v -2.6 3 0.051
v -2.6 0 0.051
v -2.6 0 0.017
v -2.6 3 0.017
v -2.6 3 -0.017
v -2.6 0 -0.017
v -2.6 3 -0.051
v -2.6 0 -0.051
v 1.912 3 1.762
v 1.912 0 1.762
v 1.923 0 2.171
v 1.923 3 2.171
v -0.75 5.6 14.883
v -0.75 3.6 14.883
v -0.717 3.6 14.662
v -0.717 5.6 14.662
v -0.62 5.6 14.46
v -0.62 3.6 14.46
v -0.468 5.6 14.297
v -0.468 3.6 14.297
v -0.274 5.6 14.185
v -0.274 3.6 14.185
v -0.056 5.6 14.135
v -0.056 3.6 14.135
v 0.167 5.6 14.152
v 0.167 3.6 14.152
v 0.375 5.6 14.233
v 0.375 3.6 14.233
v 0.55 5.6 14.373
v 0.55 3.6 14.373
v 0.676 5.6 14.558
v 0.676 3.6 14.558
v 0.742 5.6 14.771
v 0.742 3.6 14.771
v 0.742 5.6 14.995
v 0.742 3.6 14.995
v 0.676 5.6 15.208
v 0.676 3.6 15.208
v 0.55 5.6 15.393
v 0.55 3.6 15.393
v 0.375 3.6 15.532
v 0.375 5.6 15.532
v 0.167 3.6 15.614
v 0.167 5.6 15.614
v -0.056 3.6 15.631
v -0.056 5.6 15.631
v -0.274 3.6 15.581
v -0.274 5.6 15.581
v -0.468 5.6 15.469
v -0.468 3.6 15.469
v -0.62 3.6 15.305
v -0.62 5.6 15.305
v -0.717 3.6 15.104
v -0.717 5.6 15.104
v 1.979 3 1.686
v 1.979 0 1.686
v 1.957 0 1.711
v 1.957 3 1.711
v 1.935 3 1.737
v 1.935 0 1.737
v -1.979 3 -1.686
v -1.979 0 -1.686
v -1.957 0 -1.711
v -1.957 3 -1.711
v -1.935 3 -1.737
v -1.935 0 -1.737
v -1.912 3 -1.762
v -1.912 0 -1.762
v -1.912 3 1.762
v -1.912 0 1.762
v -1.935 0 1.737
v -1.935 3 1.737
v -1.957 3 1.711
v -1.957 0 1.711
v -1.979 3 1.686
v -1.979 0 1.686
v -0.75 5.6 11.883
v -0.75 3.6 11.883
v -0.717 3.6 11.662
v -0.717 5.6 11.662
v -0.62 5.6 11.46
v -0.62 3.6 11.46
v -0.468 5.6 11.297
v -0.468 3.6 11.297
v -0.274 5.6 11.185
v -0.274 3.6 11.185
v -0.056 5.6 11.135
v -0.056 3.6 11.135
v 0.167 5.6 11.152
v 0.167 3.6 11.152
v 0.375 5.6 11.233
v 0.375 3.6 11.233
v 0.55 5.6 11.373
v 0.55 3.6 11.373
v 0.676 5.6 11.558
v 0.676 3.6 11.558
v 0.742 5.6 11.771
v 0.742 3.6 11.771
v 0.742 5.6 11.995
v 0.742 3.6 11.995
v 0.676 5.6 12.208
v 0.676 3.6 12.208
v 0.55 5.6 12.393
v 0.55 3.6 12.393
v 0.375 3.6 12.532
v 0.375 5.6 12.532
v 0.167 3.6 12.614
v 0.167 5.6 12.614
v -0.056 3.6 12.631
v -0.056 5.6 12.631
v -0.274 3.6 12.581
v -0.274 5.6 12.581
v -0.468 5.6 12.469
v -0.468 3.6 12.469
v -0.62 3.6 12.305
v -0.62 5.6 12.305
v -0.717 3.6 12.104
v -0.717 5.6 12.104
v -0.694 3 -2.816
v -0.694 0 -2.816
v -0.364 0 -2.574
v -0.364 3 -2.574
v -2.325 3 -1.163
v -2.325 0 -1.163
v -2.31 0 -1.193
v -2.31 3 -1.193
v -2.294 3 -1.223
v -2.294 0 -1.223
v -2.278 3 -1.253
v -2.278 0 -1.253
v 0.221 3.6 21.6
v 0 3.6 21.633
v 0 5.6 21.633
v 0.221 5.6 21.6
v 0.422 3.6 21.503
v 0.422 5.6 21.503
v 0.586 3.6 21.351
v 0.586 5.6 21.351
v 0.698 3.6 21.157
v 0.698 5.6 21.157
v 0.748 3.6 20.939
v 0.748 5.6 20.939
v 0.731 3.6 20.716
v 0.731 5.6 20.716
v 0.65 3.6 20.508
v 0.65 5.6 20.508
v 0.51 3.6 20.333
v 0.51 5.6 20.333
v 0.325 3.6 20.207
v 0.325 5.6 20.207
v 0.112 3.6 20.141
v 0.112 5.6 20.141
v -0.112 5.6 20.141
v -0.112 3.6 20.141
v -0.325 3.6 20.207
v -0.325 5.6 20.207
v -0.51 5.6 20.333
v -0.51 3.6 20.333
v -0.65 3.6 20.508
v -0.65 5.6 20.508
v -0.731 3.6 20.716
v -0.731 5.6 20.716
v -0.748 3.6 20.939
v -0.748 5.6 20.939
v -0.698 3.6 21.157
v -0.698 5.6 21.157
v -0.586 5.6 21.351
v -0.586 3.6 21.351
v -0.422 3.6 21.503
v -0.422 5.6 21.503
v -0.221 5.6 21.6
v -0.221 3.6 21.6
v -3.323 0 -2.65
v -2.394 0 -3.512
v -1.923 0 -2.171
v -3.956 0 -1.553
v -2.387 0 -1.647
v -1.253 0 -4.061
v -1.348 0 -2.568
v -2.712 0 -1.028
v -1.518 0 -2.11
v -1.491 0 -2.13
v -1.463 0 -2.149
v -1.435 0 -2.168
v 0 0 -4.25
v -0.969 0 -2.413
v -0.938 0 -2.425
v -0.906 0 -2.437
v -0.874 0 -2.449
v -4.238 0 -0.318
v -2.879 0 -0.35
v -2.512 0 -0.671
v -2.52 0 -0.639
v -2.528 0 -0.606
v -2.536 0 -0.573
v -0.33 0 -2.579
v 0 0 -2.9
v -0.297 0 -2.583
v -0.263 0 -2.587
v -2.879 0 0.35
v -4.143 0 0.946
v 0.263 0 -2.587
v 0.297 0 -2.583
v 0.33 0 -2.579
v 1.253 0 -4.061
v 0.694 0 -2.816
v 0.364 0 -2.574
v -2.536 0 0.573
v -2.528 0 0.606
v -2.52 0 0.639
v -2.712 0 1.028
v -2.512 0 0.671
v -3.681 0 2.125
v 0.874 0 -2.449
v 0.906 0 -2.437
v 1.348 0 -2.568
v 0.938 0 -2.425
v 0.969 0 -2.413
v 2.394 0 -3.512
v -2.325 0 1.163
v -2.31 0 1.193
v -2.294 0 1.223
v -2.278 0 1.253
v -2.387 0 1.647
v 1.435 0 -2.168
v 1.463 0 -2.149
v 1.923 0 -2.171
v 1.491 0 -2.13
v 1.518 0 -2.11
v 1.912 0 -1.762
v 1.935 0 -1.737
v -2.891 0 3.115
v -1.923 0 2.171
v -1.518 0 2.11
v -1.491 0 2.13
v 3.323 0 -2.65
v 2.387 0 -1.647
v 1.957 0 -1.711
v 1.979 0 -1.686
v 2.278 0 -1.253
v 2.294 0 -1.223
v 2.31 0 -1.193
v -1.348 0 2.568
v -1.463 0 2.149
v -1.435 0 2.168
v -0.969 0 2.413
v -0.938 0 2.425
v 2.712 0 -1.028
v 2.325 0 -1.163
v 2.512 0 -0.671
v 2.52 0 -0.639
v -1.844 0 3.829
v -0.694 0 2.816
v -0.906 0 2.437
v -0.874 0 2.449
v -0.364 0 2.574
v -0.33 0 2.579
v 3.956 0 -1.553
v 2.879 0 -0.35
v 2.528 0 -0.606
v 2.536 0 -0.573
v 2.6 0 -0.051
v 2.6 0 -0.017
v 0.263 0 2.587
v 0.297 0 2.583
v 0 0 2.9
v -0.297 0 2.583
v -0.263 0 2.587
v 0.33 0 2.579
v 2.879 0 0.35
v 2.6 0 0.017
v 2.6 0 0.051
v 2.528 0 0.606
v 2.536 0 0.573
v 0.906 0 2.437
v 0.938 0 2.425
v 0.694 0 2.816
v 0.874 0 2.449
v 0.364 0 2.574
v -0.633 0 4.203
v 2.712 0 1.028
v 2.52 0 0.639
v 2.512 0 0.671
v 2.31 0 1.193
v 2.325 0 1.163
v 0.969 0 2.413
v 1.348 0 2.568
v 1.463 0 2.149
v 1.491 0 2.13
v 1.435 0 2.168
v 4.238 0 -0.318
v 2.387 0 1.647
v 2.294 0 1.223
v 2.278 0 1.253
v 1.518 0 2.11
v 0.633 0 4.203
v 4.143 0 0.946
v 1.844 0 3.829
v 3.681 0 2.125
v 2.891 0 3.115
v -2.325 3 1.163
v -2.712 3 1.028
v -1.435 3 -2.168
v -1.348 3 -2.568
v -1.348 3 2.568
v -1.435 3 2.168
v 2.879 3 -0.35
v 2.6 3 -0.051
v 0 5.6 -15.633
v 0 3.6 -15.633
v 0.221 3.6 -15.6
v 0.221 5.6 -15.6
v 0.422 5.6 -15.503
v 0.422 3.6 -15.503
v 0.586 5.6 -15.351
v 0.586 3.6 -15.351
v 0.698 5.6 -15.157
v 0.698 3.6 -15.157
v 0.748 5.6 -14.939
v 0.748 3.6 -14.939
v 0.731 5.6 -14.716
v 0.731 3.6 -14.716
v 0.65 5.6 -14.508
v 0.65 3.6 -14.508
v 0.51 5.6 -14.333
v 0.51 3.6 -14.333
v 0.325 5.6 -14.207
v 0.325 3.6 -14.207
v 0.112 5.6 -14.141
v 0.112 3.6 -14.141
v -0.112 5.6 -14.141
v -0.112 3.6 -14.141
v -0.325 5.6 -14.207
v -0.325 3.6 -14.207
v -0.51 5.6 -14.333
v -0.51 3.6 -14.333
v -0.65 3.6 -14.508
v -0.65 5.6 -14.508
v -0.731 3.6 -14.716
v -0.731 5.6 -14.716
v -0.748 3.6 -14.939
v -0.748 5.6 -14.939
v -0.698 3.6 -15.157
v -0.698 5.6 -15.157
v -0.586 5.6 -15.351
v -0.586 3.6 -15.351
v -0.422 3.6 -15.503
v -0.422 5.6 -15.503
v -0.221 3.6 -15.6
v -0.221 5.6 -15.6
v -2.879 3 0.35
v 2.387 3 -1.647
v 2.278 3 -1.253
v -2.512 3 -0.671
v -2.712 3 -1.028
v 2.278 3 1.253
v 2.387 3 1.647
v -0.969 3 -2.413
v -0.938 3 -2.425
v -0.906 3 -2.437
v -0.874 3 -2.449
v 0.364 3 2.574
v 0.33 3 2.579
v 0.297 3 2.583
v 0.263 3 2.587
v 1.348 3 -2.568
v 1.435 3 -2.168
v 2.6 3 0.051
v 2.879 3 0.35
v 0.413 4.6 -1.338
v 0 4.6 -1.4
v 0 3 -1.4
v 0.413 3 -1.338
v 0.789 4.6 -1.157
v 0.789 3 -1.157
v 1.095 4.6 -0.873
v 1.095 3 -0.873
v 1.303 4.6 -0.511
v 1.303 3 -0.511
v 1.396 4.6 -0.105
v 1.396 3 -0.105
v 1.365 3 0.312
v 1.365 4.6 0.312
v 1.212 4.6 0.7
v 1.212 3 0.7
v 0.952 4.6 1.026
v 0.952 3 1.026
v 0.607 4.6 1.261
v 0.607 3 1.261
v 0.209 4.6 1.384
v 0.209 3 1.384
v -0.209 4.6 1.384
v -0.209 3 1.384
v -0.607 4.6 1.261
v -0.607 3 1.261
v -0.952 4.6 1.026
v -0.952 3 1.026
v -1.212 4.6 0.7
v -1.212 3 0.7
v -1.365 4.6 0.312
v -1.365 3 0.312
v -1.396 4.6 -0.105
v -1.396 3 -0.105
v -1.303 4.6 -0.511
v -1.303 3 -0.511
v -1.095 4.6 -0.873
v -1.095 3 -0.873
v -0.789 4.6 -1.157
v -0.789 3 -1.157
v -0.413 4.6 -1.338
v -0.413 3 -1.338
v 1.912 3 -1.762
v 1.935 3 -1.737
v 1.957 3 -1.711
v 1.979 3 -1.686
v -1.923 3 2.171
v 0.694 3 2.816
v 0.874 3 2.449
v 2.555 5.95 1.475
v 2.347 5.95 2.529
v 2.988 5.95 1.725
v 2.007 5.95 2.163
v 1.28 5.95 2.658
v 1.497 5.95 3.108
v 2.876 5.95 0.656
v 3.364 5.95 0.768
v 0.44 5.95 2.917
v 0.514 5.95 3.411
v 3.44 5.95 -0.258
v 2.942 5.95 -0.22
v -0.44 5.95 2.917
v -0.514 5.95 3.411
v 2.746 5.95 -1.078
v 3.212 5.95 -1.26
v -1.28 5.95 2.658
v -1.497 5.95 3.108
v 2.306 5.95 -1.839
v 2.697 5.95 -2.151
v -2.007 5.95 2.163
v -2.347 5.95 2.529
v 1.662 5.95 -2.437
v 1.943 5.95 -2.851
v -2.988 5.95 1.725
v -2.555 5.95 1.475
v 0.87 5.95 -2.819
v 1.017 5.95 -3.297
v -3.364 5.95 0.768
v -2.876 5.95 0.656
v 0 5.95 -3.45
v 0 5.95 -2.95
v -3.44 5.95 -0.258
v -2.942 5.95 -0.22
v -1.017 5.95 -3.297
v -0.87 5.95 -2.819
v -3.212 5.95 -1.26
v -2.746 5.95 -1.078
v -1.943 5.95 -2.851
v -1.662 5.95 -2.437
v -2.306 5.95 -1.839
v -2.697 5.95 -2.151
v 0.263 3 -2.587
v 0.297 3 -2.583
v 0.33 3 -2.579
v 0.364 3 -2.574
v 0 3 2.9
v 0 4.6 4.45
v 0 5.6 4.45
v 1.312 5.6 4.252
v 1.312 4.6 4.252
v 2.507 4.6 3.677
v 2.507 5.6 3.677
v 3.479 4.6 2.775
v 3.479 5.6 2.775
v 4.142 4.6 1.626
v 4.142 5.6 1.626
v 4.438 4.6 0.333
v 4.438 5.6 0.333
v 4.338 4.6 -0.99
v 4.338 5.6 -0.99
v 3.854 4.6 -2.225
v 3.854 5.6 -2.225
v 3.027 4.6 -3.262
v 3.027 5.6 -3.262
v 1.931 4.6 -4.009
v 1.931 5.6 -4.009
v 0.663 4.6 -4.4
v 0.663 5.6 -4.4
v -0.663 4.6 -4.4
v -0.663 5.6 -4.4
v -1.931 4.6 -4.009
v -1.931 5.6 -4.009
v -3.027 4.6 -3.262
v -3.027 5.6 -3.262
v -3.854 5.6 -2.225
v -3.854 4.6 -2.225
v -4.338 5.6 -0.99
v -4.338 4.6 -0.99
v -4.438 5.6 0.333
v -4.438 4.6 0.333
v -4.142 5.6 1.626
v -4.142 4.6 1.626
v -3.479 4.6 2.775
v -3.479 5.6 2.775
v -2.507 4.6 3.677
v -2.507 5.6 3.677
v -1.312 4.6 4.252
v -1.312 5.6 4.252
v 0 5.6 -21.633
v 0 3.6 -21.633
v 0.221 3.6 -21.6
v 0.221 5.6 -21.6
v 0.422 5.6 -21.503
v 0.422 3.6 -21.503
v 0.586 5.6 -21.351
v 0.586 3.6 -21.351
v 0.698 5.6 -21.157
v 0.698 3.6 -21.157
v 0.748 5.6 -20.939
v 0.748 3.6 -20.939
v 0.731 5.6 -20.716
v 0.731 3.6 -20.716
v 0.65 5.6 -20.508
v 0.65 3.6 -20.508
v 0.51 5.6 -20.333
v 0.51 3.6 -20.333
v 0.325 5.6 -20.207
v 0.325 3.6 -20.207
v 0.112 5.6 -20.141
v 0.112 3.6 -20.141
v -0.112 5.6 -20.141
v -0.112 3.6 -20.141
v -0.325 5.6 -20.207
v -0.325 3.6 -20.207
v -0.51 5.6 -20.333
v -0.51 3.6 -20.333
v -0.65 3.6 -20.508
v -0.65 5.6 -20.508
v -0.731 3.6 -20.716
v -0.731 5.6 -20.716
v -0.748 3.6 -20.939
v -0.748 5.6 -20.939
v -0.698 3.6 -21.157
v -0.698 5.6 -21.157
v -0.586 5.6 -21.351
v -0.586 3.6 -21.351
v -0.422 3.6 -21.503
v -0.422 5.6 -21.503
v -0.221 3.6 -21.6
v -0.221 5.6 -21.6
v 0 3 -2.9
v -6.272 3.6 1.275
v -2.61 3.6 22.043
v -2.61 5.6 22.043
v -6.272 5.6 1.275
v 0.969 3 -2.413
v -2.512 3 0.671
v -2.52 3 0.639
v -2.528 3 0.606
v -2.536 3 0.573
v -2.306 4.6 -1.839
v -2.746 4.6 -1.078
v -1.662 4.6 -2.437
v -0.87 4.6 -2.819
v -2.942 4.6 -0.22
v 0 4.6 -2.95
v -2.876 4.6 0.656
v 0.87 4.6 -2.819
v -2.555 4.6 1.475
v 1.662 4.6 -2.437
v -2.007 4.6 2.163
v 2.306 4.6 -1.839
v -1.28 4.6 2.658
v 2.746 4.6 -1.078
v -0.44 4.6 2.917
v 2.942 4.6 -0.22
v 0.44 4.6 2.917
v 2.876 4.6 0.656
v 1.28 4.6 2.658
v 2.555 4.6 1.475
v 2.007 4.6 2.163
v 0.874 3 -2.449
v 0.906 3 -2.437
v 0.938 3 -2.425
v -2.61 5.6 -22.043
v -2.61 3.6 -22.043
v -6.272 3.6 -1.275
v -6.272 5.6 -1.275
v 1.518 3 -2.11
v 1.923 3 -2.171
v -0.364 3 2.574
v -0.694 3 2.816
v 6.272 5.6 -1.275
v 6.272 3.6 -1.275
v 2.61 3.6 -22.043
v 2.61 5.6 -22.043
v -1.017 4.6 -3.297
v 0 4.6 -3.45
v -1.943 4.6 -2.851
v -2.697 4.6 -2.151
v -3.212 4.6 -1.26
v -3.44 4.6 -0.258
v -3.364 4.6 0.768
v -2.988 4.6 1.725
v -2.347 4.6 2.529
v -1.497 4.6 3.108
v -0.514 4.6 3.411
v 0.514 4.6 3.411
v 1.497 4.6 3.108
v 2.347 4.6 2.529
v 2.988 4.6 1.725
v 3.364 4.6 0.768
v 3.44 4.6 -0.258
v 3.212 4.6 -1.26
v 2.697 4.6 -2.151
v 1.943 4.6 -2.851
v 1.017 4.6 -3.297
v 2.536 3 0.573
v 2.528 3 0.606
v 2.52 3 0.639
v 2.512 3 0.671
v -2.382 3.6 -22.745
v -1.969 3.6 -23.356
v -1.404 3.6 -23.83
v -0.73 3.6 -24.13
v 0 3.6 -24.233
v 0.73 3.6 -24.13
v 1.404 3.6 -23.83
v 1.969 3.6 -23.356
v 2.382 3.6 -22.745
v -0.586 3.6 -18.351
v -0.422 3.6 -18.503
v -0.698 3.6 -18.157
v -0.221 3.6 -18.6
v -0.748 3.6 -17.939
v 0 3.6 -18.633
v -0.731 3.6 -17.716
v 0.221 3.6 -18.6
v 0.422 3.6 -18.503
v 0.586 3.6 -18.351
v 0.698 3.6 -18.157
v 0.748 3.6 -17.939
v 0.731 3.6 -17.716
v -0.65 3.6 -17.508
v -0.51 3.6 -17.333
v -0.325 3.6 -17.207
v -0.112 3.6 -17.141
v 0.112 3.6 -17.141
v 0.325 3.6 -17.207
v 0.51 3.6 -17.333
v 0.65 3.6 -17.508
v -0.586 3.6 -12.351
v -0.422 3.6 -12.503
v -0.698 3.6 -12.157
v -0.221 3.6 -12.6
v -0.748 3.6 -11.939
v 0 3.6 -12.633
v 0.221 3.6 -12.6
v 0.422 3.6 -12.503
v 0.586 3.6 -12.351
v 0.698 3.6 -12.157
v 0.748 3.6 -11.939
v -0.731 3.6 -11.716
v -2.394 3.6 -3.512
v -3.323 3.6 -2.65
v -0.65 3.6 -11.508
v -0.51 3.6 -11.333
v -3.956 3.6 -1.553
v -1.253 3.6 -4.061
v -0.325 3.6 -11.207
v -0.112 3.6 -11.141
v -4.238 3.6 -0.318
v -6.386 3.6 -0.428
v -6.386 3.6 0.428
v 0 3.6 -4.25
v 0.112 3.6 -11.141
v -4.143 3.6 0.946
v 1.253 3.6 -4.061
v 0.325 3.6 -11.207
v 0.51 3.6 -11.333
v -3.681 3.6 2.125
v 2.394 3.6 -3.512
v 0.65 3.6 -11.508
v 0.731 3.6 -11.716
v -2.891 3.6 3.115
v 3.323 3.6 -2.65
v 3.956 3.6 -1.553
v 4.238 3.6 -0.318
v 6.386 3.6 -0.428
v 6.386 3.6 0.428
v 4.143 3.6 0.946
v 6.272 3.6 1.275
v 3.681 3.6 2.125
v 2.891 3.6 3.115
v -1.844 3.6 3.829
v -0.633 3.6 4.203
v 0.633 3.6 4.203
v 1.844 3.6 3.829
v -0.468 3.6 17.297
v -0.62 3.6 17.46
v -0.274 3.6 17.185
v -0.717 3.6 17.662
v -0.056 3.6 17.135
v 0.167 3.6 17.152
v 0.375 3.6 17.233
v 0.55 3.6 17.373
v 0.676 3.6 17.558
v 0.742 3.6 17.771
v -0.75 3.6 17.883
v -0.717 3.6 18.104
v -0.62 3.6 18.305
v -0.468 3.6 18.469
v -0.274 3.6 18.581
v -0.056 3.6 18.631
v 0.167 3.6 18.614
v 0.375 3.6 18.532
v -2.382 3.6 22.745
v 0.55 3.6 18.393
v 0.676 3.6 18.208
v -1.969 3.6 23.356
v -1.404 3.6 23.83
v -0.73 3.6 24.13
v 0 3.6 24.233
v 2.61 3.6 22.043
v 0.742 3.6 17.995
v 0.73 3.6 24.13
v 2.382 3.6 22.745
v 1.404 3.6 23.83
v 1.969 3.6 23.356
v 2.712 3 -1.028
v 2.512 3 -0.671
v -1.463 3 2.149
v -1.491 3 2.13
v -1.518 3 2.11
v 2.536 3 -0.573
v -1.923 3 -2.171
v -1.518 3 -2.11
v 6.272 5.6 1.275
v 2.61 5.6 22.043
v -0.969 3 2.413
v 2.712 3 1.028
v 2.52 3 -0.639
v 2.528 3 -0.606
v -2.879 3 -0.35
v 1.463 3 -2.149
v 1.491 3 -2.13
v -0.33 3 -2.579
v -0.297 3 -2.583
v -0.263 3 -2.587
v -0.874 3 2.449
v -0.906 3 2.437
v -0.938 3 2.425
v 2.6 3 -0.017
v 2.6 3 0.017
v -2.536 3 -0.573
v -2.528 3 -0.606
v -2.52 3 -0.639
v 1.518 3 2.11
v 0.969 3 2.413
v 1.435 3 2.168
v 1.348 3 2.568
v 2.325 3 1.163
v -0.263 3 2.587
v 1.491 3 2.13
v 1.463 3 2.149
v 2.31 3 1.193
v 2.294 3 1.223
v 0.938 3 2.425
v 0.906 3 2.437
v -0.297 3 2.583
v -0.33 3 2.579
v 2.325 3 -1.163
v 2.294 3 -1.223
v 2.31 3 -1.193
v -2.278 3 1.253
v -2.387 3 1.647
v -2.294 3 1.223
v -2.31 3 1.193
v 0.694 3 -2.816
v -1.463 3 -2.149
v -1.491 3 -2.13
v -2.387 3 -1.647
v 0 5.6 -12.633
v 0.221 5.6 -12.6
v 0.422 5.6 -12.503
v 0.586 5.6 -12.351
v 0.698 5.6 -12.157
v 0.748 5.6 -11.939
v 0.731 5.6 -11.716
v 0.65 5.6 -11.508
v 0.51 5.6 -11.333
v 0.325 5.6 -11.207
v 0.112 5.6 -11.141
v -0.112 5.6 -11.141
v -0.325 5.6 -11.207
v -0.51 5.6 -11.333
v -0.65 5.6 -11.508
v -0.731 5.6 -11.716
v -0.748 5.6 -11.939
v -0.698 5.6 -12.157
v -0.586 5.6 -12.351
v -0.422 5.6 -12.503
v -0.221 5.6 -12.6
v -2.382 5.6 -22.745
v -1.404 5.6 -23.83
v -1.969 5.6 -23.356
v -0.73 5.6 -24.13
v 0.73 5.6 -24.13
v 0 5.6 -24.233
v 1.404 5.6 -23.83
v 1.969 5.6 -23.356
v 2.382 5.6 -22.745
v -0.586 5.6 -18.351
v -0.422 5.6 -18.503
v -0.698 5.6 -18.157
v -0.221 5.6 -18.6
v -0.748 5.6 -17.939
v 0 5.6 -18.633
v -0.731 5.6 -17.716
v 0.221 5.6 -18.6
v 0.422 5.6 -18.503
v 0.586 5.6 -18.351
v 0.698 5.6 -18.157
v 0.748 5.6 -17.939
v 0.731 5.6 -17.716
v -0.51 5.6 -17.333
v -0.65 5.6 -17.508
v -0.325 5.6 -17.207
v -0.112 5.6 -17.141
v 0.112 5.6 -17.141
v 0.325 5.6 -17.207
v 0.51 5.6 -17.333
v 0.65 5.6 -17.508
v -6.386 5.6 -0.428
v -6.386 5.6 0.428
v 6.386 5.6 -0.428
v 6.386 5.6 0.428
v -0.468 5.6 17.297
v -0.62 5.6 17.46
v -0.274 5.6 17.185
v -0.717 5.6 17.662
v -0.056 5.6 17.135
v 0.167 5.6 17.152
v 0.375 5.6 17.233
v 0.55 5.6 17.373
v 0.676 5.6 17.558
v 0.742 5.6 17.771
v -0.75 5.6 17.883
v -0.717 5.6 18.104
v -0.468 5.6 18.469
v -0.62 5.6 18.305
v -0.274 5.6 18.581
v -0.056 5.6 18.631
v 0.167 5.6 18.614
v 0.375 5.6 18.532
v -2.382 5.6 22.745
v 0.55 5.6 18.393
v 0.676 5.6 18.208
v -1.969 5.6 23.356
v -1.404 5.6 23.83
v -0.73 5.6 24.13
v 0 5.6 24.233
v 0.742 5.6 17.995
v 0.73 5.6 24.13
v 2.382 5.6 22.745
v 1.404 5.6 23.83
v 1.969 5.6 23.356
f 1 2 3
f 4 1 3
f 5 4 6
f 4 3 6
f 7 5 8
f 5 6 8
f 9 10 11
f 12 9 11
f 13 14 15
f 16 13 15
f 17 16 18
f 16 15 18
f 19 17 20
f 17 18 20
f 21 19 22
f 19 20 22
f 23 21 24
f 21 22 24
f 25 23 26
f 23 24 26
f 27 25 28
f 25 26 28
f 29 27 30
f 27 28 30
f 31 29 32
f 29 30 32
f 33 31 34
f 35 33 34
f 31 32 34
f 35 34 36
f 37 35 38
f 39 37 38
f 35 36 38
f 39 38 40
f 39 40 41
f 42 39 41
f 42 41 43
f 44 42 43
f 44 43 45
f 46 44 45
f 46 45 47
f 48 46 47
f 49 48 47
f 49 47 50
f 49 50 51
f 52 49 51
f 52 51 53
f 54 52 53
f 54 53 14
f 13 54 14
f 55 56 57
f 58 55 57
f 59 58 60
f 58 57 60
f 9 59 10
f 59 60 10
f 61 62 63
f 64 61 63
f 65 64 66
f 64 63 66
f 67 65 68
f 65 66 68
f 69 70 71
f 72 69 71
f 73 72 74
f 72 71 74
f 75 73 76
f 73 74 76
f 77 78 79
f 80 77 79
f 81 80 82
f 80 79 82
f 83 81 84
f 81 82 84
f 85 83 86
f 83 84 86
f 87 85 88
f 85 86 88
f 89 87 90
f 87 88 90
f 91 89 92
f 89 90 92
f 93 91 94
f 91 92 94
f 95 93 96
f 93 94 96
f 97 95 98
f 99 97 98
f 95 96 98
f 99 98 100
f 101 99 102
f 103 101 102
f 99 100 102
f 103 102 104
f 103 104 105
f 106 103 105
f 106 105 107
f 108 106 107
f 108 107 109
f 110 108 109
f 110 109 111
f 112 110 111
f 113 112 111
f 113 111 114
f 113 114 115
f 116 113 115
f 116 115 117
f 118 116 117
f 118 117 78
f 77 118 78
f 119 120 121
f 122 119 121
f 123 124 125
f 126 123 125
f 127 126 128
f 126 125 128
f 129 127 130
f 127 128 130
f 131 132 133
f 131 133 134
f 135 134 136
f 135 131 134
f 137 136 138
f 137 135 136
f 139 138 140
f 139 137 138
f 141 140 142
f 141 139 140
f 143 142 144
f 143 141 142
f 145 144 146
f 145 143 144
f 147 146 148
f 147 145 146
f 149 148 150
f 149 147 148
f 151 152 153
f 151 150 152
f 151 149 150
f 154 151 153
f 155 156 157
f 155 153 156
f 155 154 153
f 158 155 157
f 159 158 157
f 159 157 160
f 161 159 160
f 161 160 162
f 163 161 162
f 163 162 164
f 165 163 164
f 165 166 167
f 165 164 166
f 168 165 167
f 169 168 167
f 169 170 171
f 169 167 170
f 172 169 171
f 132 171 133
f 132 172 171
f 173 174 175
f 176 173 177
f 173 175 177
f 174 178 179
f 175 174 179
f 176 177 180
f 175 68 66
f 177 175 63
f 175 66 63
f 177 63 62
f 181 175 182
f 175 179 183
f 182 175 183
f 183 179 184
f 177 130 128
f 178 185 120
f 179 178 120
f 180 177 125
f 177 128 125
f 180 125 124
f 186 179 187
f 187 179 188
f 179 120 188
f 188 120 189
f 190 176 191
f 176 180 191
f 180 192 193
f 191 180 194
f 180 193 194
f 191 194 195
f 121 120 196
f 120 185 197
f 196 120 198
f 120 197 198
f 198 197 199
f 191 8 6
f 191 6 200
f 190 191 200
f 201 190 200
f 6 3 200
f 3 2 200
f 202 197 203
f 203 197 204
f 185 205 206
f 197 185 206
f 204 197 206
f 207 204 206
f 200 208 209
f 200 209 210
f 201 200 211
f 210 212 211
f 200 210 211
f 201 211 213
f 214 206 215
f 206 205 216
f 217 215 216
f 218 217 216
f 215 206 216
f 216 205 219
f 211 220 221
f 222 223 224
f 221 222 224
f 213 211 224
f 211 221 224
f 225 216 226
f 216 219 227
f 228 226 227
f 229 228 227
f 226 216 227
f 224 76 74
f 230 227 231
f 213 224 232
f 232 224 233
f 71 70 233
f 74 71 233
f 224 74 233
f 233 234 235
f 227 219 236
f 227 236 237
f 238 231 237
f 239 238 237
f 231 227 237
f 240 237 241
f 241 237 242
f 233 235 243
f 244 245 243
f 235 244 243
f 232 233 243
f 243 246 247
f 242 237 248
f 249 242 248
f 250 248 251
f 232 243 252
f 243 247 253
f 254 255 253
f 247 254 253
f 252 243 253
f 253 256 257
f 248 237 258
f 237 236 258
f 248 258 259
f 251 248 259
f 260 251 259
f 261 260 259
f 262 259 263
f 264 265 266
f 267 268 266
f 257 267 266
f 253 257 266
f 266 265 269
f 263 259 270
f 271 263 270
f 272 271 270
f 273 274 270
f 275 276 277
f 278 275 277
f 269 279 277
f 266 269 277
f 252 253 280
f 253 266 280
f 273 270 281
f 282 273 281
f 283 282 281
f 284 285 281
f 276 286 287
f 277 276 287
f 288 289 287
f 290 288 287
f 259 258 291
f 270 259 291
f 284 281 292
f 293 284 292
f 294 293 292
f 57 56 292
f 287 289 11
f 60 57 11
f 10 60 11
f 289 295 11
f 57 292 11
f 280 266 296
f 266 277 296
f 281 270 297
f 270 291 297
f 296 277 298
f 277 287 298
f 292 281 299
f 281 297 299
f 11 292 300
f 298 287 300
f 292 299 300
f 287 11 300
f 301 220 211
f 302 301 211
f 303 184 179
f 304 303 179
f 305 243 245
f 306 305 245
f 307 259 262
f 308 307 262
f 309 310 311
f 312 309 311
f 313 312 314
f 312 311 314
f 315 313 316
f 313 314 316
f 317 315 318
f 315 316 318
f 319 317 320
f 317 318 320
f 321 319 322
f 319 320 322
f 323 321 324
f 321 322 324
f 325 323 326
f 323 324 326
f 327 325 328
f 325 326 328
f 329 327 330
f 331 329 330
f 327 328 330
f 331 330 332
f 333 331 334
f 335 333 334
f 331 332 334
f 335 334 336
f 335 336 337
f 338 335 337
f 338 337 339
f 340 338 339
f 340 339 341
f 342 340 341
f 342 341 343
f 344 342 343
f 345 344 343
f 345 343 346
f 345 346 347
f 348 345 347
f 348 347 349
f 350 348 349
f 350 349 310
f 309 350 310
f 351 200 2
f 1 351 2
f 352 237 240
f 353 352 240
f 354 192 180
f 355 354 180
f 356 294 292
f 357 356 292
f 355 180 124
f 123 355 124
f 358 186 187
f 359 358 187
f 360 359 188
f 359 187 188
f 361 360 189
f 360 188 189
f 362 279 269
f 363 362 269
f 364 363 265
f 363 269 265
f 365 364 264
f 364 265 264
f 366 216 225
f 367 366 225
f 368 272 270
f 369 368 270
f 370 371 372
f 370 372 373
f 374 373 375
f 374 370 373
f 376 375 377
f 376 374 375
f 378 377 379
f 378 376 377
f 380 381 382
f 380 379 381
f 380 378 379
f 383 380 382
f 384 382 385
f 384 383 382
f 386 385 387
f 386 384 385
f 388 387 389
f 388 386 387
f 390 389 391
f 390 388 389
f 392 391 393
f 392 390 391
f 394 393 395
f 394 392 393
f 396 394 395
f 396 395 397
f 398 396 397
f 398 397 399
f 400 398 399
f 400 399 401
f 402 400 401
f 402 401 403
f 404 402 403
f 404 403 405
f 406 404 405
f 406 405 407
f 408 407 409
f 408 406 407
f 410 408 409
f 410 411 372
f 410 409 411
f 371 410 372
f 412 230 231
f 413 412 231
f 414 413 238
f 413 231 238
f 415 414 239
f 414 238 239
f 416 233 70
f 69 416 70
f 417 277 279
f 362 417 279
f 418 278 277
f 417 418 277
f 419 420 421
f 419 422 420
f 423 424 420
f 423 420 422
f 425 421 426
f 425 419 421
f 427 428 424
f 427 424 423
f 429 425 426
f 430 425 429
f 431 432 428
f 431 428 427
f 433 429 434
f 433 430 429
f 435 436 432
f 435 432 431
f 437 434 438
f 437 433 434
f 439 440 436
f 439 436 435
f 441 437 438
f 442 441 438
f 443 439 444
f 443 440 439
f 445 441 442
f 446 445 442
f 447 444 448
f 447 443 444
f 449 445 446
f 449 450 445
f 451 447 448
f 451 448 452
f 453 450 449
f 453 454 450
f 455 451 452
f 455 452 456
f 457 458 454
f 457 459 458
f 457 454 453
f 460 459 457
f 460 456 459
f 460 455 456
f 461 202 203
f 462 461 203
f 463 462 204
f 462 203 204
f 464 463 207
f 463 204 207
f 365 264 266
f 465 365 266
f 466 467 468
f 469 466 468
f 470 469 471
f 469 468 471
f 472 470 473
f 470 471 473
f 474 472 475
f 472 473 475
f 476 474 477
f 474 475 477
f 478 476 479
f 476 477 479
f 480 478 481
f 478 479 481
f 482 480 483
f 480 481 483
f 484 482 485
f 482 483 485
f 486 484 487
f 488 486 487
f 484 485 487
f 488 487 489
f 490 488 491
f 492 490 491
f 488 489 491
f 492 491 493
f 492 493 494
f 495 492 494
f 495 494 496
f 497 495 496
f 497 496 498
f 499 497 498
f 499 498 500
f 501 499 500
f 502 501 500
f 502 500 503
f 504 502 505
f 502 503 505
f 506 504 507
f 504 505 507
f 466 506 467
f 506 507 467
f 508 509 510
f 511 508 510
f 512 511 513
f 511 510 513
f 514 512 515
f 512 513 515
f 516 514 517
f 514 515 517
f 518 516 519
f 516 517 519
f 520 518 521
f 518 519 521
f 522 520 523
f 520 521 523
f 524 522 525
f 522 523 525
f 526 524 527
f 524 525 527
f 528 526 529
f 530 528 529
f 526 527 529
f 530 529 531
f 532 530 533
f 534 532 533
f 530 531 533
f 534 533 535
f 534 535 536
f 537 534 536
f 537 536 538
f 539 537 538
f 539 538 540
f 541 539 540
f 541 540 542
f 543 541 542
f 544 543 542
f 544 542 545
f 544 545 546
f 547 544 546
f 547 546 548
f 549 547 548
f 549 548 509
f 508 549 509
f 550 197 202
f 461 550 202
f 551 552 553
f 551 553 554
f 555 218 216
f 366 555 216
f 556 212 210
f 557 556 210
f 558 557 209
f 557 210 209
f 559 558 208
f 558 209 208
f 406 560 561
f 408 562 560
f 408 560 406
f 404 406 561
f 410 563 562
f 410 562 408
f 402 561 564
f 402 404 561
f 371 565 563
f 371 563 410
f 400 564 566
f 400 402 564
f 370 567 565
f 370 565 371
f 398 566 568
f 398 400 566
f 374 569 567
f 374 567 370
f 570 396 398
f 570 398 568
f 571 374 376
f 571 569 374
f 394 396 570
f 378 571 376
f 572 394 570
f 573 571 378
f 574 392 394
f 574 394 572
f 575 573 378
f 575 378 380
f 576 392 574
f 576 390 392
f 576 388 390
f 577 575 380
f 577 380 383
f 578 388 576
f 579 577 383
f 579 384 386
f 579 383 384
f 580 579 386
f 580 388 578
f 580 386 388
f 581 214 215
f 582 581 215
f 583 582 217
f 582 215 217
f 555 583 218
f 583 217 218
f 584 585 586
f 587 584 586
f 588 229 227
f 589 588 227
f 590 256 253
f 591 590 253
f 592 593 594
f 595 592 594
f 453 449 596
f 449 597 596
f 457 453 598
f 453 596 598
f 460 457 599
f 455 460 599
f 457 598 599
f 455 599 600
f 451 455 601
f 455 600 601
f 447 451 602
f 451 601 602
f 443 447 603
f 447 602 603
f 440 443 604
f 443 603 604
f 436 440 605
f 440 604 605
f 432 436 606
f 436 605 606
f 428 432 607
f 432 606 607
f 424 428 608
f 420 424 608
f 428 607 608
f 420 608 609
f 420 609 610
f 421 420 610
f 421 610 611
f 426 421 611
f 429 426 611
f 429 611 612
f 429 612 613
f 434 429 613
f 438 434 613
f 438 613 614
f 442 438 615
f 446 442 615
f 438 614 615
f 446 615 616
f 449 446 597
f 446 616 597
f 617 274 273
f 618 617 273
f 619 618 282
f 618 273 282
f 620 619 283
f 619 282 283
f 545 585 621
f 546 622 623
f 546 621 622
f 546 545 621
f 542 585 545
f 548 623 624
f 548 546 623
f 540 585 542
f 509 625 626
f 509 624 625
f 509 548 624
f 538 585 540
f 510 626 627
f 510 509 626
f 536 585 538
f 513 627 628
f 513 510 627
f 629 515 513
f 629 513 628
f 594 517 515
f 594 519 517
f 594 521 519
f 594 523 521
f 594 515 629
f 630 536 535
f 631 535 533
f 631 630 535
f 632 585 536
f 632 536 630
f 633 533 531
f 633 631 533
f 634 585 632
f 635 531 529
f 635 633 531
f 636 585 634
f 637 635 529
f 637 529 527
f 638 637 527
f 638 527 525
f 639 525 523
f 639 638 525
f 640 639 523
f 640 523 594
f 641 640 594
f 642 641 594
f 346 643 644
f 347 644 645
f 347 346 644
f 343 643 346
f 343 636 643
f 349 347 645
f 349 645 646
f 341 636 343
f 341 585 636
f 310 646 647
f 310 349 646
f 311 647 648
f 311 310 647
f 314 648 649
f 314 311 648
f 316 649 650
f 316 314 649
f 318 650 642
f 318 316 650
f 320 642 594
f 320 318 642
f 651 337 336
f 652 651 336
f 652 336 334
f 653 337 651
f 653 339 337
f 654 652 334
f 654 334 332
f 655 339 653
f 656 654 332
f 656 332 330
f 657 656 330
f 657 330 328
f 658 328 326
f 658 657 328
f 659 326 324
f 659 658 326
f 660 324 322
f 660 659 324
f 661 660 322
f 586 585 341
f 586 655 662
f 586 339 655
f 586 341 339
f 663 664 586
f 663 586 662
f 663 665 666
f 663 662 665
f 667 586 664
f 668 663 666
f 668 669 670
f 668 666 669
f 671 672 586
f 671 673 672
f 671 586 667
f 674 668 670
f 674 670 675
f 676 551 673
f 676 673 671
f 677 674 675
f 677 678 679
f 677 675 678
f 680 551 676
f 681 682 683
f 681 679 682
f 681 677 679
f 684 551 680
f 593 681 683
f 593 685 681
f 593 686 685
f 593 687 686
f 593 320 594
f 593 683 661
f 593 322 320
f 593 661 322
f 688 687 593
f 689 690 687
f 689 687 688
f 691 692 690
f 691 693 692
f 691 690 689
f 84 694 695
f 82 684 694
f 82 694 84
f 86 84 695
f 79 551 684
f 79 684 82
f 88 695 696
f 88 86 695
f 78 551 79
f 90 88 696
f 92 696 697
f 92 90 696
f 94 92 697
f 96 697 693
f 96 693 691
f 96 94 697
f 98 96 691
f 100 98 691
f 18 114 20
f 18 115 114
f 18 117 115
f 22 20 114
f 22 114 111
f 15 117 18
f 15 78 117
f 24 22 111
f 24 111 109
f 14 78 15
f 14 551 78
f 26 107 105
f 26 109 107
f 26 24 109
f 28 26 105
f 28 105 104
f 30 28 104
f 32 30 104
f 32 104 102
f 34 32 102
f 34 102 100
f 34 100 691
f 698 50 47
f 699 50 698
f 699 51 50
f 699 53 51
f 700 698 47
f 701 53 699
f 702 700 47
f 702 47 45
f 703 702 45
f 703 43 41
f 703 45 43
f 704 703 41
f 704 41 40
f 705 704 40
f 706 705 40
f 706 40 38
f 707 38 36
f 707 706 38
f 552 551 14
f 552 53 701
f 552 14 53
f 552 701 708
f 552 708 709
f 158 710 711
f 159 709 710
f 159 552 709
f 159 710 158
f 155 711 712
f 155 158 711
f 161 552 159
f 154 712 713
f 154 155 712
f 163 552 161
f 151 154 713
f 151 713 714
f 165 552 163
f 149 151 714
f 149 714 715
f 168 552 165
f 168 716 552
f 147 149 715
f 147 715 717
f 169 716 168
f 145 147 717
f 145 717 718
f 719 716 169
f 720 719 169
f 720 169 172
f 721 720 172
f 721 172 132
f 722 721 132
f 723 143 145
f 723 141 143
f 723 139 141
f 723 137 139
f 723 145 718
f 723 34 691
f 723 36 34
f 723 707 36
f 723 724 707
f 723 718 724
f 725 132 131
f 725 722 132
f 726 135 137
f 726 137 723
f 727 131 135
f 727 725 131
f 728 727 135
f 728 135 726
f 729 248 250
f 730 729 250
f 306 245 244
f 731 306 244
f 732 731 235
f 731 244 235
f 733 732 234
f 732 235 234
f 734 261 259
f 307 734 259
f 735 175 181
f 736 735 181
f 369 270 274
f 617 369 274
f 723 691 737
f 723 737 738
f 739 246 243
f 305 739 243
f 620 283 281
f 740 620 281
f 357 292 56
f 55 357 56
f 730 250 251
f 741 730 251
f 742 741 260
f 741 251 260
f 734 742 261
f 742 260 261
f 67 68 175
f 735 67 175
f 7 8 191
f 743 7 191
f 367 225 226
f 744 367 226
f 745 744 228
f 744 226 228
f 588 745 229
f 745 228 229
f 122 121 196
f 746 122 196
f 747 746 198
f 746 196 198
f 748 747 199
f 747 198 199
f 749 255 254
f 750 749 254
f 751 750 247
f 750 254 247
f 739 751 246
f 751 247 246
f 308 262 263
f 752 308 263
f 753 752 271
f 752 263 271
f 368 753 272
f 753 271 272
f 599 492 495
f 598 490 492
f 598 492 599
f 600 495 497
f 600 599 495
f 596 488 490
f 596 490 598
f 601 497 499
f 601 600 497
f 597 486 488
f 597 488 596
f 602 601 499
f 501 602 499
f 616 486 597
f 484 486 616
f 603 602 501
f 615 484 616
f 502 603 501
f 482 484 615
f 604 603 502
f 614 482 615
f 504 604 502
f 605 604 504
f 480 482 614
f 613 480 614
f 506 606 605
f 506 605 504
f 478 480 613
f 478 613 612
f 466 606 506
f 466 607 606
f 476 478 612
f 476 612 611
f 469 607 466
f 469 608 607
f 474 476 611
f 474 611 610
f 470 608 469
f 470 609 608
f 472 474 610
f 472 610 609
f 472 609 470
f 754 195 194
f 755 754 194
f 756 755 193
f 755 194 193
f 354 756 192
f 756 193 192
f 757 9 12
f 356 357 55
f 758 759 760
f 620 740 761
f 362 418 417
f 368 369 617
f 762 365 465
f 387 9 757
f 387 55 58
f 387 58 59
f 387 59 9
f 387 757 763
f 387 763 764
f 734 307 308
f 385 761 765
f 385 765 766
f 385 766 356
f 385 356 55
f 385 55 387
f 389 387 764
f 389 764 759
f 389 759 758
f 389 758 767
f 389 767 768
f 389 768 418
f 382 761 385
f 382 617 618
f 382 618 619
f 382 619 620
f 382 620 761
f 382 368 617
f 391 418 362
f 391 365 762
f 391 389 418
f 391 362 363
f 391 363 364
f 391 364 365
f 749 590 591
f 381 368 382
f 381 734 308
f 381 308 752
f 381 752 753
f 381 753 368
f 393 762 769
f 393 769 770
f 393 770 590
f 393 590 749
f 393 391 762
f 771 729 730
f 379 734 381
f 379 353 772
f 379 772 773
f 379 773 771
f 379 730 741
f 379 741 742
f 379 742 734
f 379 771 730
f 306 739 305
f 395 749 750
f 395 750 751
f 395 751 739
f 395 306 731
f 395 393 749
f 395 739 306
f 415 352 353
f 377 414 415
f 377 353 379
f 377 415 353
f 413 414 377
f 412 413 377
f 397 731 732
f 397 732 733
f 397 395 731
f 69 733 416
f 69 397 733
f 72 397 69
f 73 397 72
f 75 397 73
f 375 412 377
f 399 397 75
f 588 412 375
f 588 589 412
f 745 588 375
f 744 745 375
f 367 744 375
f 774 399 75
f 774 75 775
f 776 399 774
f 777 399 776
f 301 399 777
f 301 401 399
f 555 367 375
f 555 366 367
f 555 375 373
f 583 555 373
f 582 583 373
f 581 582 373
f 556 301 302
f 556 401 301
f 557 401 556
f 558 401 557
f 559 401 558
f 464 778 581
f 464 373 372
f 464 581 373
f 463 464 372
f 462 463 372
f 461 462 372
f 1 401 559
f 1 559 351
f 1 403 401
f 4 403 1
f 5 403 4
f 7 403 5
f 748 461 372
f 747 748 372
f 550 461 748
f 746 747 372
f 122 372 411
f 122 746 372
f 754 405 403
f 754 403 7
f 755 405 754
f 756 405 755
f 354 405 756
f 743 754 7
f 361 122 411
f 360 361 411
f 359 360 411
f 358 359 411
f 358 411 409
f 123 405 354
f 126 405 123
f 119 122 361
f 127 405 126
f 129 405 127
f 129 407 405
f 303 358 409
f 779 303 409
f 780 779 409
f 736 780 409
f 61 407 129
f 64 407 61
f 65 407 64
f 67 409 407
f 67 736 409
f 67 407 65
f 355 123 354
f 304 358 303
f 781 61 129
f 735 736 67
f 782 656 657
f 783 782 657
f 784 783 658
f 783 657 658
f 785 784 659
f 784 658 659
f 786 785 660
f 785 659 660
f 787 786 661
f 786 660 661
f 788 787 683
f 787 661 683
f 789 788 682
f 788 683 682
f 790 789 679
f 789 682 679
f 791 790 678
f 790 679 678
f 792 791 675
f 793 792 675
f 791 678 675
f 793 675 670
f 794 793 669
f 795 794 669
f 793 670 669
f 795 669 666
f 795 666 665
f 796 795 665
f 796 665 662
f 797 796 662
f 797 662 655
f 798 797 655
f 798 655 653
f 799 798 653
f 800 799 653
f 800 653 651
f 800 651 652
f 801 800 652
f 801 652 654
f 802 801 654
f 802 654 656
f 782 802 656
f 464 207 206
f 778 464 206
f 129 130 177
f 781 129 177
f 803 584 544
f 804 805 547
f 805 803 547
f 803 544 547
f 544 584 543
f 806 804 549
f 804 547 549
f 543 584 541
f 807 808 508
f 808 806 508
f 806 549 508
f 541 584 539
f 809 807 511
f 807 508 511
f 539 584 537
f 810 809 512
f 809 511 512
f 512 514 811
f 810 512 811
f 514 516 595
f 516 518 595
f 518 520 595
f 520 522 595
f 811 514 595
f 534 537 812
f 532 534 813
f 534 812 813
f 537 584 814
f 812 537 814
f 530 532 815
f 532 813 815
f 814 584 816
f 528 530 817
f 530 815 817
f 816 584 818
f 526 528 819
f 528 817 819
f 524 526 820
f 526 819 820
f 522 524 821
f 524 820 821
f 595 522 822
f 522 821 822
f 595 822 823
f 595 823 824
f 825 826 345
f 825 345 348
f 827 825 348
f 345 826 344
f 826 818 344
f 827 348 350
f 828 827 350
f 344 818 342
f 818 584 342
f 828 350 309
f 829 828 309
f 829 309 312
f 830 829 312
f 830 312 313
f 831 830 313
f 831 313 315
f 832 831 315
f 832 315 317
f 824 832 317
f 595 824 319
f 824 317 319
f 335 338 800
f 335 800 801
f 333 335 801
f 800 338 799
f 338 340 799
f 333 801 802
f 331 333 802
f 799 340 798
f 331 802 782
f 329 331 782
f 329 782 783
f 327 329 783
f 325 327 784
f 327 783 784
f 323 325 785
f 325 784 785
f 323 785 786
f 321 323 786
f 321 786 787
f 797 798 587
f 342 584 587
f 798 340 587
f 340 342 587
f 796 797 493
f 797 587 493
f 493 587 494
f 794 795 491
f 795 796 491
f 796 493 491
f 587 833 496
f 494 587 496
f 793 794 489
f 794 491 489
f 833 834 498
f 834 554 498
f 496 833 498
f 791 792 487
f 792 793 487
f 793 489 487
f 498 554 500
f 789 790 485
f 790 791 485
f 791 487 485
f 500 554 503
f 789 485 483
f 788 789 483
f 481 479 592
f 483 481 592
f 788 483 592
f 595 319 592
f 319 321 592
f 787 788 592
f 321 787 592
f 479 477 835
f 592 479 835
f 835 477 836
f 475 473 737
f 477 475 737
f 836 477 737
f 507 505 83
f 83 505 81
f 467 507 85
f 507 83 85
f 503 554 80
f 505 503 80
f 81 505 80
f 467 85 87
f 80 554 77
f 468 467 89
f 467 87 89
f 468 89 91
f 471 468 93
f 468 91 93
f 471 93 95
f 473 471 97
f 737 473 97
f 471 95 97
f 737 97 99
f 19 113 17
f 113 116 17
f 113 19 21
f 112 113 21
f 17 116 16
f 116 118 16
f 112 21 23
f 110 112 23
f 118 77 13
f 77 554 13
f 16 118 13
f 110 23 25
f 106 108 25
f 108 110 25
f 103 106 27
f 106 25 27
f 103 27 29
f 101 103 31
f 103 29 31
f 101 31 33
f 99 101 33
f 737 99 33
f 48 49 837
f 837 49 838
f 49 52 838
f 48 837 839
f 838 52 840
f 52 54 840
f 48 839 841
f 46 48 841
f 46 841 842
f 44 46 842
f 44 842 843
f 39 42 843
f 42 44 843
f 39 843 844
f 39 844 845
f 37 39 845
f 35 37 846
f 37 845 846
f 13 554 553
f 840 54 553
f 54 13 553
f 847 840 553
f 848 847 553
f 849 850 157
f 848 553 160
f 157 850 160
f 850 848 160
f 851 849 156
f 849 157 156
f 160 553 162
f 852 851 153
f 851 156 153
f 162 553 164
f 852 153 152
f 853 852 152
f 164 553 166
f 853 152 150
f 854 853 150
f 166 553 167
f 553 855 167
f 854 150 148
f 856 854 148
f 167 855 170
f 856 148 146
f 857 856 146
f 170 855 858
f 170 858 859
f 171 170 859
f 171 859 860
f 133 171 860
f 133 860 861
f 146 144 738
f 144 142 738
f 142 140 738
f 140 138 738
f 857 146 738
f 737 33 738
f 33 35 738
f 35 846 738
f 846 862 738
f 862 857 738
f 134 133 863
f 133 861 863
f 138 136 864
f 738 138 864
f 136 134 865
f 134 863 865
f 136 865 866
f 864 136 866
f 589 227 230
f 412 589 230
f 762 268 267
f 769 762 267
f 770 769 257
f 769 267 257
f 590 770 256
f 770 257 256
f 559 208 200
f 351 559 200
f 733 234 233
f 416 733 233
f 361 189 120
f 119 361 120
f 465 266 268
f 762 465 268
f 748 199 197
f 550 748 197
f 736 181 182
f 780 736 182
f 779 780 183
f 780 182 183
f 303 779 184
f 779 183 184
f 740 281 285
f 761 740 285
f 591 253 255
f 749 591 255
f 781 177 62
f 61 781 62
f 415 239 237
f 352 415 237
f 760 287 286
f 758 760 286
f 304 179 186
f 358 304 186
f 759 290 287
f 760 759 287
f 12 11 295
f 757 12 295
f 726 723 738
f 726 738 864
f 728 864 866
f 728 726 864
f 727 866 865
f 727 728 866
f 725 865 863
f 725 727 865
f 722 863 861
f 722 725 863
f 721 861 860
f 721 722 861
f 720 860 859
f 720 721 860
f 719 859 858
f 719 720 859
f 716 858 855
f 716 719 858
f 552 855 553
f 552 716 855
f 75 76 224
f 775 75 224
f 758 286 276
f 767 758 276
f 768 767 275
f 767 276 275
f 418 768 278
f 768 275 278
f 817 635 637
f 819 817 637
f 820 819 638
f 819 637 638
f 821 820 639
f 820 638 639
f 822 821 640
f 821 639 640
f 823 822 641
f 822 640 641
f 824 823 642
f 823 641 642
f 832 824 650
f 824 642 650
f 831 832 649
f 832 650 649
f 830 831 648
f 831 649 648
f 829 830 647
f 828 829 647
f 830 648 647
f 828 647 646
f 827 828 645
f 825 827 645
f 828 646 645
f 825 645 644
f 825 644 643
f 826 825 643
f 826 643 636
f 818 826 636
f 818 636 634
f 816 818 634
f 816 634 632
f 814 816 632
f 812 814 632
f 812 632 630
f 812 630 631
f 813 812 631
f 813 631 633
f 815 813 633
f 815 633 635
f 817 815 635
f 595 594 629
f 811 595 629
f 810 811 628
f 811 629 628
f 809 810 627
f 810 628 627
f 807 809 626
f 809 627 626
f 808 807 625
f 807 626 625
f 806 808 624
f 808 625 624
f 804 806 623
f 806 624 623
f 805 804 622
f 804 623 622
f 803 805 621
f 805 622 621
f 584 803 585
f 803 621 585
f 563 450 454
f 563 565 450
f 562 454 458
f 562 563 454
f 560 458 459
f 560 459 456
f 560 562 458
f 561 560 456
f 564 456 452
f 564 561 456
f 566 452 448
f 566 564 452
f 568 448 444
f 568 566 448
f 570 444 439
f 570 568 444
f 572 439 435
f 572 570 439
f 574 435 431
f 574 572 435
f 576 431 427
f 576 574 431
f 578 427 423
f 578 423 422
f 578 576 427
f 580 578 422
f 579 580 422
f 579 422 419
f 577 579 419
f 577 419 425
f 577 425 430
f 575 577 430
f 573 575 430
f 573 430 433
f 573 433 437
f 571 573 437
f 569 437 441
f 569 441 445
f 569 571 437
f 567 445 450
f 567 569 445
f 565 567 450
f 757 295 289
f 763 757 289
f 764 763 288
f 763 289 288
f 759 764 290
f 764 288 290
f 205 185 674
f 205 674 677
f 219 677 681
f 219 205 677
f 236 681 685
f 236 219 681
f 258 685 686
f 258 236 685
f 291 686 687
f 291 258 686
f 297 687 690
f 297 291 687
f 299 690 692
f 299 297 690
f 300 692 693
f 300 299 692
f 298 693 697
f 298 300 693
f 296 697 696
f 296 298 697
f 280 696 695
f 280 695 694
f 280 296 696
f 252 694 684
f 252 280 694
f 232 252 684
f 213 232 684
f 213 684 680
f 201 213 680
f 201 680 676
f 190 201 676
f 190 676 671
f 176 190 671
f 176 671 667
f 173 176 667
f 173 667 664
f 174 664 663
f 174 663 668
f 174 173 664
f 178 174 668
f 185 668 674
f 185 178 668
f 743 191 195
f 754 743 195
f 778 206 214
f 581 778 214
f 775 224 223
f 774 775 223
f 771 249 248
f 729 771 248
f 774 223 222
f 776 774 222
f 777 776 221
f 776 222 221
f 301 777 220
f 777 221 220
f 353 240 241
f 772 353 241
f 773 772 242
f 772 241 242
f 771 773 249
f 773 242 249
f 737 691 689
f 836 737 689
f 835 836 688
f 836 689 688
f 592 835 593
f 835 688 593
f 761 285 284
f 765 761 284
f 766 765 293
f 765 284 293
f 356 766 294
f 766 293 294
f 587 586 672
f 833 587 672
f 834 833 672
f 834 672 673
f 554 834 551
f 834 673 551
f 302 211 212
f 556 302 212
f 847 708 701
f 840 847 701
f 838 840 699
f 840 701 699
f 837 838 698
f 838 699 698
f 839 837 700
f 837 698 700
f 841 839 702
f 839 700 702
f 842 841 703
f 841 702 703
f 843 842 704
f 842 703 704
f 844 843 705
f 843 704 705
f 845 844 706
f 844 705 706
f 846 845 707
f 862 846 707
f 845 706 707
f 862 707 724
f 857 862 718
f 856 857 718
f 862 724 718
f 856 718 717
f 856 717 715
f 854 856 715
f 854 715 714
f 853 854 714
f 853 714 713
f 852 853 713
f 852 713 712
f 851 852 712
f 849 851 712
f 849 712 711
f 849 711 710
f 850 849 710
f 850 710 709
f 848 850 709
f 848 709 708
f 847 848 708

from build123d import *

# Parameters (mm, degrees)
SKETCH1_R               = 6.4
BOSS_EXTRUDE1_DEPTH     = 5.6
HORN_START              = -2
HORN_DEPTH              = 2
SKETCH4_R               = 1.4
CUT_EXTRUDE1_DEPTH      = 26.681786257
SKETCH5_R               = 0.75
CUT_EXTRUDE2_DEPTH      = 26.681786257
LPATTERN1_COUNT         = 4
LPATTERN1_PITCH         = 3
MIRROR1_COPY_1_SKETCH_R = 0.75
MIRROR1_COPY_1_DEPTH    = 26.681786257
MIRROR1_COPY_2_SKETCH_R = 0.75
MIRROR1_COPY_2_DEPTH    = 26.681786257
MIRROR1_COPY_3_SKETCH_R = 0.75
MIRROR1_COPY_3_DEPTH    = 26.681786257
CUT_EXTRUDE4_DEPTH      = 3
CIRPATTERN2_COUNT       = 26
SKETCH9_R               = 2.6
CUT_EXTRUDE5_DEPTH      = 3
SKETCH10_R              = 6.4
SKETCH10_R_2            = 4.25
CUT_EXTRUDE6_DEPTH      = 3.6
SKETCH12_R              = 4.45
CUT_EXTRUDE7_DEPTH      = 1
SKETCH13_R              = 3.45
SKETCH13_R_2            = 2.95
BOSS_EXTRUDE6_DEPTH     = 1
SKETCH14_R              = 3.45
SKETCH14_R_2            = 2.95
BOSS_EXTRUDE7_DEPTH     = 0.35


with BuildPart() as part:
    # Sketch1 → Boss-Extrude1 (new body)
    with BuildSketch(Plane(origin=(0, 0, 0), x_dir=(1, 0, 0), z_dir=(0, 1, 0))):
        with Locations(Location((0, 0, 0), (0, 0, 270))):
            Circle(SKETCH1_R)
    extrude(amount=BOSS_EXTRUDE1_DEPTH)

    # Sketch2 → horn (add)
    with BuildSketch(Plane(origin=(0, 5.6, 0), x_dir=(1, 0, 0), z_dir=(0, 1, 0)).offset(HORN_START)):
        with BuildLine():
            Line((-2.609740545, 22.043082174), (-6.271723477, 1.27494495))
            ThreePointArc((-6.271723477, 1.27494495), (0, 6.4), (6.271723477, 1.27494495))
            Line((6.271723477, 1.27494495), (2.609740545, 22.043082174))
            ThreePointArc((2.609740545, 22.043082174), (0, 24.232914504), (-2.609740545, 22.043082174))
        make_face()
    horn = extrude(amount=HORN_DEPTH)

    # Sketch4 → Cut-Extrude1 (cut, through all)
    with BuildSketch(Plane(origin=(0, 5.6, 0), x_dir=(-1, 0, 0), z_dir=(0, -1, 0))):
        with Locations(Location((0, 0, 0), (0, 0, 90))):
            Circle(SKETCH4_R)
    extrude(amount=CUT_EXTRUDE1_DEPTH, mode=Mode.SUBTRACT)

    # Sketch5 → Cut-Extrude2 (cut, through all)
    with BuildSketch(Plane(origin=(0, 0, 0), x_dir=(-1, 0, 0), z_dir=(0, -1, 0))):
        with Locations(Location((0, 20.882914504, 0), (0, 0, 90))):
            Circle(SKETCH5_R)
    cut_extrude2 = extrude(amount=-CUT_EXTRUDE2_DEPTH, mode=Mode.SUBTRACT)

    # LPattern1: Cut-Extrude2 ×4
    with Locations(*[(0, 0, i * LPATTERN1_PITCH) for i in range(1, LPATTERN1_COUNT)]):
        add(cut_extrude2, mode=Mode.SUBTRACT)

    # Mirror1: horn, Cut-Extrude2 across plane
    add(horn.mirror(Plane.XY))
    add(cut_extrude2.mirror(Plane.XY), mode=Mode.SUBTRACT)

    # Mirror1 copy 1 sketch → Mirror1 copy 1 (cut, through all)
    with BuildSketch(Plane(origin=(0, 0, -3), x_dir=(-1, 0, 0), z_dir=(0, -1, 0))):
        with Locations((0, -20.882914504)):
            Circle(MIRROR1_COPY_1_SKETCH_R)
    extrude(amount=-MIRROR1_COPY_1_DEPTH, mode=Mode.SUBTRACT)

    # Mirror1 copy 2 sketch → Mirror1 copy 2 (cut, through all)
    with BuildSketch(Plane(origin=(0, 0, -6), x_dir=(-1, 0, 0), z_dir=(0, -1, 0))):
        with Locations((0, -20.882914504)):
            Circle(MIRROR1_COPY_2_SKETCH_R)
    extrude(amount=-MIRROR1_COPY_2_DEPTH, mode=Mode.SUBTRACT)

    # Mirror1 copy 3 sketch → Mirror1 copy 3 (cut, through all)
    with BuildSketch(Plane(origin=(0, 0, -9), x_dir=(-1, 0, 0), z_dir=(0, -1, 0))):
        with Locations((0, -20.882914504)):
            Circle(MIRROR1_COPY_3_SKETCH_R)
    extrude(amount=-MIRROR1_COPY_3_DEPTH, mode=Mode.SUBTRACT)

    # Sketch8 → Cut-Extrude4 (cut)
    with BuildSketch(Plane(origin=(0, 0, 0), x_dir=(-1, 0, 0), z_dir=(0, -1, 0))):
        with BuildLine():
            Line((0, -2.9), (0.262912611, -2.586672952))
            ThreePointArc((0.262912611, -2.586672952), (0, -2.6), (-0.262912611, -2.586672952))
            Line((-0.262912611, -2.586672952), (0, -2.9))
        make_face()
    cut_extrude4 = extrude(amount=-CUT_EXTRUDE4_DEPTH, mode=Mode.SUBTRACT)

    # CirPattern2: Cut-Extrude4 ×26 about axis
    cirpattern2_axis = Axis((0, 0, 0), (0, 1, 0))
    for i in range(1, CIRPATTERN2_COUNT):
        add(cut_extrude4.rotate(cirpattern2_axis, i * 360 / CIRPATTERN2_COUNT), mode=Mode.SUBTRACT)

    # Sketch9 → Cut-Extrude5 (cut)
    with BuildSketch(Plane(origin=(0, 0, 0), x_dir=(-1, 0, 0), z_dir=(0, -1, 0))):
        Circle(SKETCH9_R)
    extrude(amount=-CUT_EXTRUDE5_DEPTH, mode=Mode.SUBTRACT)

    # Sketch10 → Cut-Extrude6 (cut)
    with BuildSketch(Plane(origin=(0, 0, 0), x_dir=(-1, 0, 0), z_dir=(0, -1, 0))):
        Circle(SKETCH10_R)
        with Locations(Location((0, 0, 0), (0, 0, 90))):
            Circle(SKETCH10_R_2, mode=Mode.SUBTRACT)
    extrude(amount=-CUT_EXTRUDE6_DEPTH, mode=Mode.SUBTRACT)

    # Sketch12 → Cut-Extrude7 (cut)
    with BuildSketch(Plane(origin=(0, 5.6, 0), x_dir=(1, 0, 0), z_dir=(0, 1, 0))):
        with Locations(Location((0, 0, 0), (0, 0, 270))):
            Circle(SKETCH12_R)
    extrude(amount=-CUT_EXTRUDE7_DEPTH, mode=Mode.SUBTRACT)

    # Sketch13 → Boss-Extrude6 (add)
    with BuildSketch(Plane(origin=(0, 4.6, 0), x_dir=(1, 0, 0), z_dir=(0, 1, 0))):
        with Locations(Location((0, 0, 0), (0, 0, 90))):
            Circle(SKETCH13_R)
        with Locations(Location((0, 0, 0), (0, 0, 90))):
            Circle(SKETCH13_R_2, mode=Mode.SUBTRACT)
    extrude(amount=BOSS_EXTRUDE6_DEPTH)

    # Sketch14 → Boss-Extrude7 (add)
    with BuildSketch(Plane(origin=(0, 5.6, 0), x_dir=(1, 0, 0), z_dir=(0, 1, 0))):
        with Locations(Location((0, 0, 0), (0, 0, 90))):
            Circle(SKETCH14_R)
        with Locations(Location((0, 0, 0), (0, 0, 90))):
            Circle(SKETCH14_R_2, mode=Mode.SUBTRACT)
    extrude(amount=BOSS_EXTRUDE7_DEPTH)


solid = part.part
